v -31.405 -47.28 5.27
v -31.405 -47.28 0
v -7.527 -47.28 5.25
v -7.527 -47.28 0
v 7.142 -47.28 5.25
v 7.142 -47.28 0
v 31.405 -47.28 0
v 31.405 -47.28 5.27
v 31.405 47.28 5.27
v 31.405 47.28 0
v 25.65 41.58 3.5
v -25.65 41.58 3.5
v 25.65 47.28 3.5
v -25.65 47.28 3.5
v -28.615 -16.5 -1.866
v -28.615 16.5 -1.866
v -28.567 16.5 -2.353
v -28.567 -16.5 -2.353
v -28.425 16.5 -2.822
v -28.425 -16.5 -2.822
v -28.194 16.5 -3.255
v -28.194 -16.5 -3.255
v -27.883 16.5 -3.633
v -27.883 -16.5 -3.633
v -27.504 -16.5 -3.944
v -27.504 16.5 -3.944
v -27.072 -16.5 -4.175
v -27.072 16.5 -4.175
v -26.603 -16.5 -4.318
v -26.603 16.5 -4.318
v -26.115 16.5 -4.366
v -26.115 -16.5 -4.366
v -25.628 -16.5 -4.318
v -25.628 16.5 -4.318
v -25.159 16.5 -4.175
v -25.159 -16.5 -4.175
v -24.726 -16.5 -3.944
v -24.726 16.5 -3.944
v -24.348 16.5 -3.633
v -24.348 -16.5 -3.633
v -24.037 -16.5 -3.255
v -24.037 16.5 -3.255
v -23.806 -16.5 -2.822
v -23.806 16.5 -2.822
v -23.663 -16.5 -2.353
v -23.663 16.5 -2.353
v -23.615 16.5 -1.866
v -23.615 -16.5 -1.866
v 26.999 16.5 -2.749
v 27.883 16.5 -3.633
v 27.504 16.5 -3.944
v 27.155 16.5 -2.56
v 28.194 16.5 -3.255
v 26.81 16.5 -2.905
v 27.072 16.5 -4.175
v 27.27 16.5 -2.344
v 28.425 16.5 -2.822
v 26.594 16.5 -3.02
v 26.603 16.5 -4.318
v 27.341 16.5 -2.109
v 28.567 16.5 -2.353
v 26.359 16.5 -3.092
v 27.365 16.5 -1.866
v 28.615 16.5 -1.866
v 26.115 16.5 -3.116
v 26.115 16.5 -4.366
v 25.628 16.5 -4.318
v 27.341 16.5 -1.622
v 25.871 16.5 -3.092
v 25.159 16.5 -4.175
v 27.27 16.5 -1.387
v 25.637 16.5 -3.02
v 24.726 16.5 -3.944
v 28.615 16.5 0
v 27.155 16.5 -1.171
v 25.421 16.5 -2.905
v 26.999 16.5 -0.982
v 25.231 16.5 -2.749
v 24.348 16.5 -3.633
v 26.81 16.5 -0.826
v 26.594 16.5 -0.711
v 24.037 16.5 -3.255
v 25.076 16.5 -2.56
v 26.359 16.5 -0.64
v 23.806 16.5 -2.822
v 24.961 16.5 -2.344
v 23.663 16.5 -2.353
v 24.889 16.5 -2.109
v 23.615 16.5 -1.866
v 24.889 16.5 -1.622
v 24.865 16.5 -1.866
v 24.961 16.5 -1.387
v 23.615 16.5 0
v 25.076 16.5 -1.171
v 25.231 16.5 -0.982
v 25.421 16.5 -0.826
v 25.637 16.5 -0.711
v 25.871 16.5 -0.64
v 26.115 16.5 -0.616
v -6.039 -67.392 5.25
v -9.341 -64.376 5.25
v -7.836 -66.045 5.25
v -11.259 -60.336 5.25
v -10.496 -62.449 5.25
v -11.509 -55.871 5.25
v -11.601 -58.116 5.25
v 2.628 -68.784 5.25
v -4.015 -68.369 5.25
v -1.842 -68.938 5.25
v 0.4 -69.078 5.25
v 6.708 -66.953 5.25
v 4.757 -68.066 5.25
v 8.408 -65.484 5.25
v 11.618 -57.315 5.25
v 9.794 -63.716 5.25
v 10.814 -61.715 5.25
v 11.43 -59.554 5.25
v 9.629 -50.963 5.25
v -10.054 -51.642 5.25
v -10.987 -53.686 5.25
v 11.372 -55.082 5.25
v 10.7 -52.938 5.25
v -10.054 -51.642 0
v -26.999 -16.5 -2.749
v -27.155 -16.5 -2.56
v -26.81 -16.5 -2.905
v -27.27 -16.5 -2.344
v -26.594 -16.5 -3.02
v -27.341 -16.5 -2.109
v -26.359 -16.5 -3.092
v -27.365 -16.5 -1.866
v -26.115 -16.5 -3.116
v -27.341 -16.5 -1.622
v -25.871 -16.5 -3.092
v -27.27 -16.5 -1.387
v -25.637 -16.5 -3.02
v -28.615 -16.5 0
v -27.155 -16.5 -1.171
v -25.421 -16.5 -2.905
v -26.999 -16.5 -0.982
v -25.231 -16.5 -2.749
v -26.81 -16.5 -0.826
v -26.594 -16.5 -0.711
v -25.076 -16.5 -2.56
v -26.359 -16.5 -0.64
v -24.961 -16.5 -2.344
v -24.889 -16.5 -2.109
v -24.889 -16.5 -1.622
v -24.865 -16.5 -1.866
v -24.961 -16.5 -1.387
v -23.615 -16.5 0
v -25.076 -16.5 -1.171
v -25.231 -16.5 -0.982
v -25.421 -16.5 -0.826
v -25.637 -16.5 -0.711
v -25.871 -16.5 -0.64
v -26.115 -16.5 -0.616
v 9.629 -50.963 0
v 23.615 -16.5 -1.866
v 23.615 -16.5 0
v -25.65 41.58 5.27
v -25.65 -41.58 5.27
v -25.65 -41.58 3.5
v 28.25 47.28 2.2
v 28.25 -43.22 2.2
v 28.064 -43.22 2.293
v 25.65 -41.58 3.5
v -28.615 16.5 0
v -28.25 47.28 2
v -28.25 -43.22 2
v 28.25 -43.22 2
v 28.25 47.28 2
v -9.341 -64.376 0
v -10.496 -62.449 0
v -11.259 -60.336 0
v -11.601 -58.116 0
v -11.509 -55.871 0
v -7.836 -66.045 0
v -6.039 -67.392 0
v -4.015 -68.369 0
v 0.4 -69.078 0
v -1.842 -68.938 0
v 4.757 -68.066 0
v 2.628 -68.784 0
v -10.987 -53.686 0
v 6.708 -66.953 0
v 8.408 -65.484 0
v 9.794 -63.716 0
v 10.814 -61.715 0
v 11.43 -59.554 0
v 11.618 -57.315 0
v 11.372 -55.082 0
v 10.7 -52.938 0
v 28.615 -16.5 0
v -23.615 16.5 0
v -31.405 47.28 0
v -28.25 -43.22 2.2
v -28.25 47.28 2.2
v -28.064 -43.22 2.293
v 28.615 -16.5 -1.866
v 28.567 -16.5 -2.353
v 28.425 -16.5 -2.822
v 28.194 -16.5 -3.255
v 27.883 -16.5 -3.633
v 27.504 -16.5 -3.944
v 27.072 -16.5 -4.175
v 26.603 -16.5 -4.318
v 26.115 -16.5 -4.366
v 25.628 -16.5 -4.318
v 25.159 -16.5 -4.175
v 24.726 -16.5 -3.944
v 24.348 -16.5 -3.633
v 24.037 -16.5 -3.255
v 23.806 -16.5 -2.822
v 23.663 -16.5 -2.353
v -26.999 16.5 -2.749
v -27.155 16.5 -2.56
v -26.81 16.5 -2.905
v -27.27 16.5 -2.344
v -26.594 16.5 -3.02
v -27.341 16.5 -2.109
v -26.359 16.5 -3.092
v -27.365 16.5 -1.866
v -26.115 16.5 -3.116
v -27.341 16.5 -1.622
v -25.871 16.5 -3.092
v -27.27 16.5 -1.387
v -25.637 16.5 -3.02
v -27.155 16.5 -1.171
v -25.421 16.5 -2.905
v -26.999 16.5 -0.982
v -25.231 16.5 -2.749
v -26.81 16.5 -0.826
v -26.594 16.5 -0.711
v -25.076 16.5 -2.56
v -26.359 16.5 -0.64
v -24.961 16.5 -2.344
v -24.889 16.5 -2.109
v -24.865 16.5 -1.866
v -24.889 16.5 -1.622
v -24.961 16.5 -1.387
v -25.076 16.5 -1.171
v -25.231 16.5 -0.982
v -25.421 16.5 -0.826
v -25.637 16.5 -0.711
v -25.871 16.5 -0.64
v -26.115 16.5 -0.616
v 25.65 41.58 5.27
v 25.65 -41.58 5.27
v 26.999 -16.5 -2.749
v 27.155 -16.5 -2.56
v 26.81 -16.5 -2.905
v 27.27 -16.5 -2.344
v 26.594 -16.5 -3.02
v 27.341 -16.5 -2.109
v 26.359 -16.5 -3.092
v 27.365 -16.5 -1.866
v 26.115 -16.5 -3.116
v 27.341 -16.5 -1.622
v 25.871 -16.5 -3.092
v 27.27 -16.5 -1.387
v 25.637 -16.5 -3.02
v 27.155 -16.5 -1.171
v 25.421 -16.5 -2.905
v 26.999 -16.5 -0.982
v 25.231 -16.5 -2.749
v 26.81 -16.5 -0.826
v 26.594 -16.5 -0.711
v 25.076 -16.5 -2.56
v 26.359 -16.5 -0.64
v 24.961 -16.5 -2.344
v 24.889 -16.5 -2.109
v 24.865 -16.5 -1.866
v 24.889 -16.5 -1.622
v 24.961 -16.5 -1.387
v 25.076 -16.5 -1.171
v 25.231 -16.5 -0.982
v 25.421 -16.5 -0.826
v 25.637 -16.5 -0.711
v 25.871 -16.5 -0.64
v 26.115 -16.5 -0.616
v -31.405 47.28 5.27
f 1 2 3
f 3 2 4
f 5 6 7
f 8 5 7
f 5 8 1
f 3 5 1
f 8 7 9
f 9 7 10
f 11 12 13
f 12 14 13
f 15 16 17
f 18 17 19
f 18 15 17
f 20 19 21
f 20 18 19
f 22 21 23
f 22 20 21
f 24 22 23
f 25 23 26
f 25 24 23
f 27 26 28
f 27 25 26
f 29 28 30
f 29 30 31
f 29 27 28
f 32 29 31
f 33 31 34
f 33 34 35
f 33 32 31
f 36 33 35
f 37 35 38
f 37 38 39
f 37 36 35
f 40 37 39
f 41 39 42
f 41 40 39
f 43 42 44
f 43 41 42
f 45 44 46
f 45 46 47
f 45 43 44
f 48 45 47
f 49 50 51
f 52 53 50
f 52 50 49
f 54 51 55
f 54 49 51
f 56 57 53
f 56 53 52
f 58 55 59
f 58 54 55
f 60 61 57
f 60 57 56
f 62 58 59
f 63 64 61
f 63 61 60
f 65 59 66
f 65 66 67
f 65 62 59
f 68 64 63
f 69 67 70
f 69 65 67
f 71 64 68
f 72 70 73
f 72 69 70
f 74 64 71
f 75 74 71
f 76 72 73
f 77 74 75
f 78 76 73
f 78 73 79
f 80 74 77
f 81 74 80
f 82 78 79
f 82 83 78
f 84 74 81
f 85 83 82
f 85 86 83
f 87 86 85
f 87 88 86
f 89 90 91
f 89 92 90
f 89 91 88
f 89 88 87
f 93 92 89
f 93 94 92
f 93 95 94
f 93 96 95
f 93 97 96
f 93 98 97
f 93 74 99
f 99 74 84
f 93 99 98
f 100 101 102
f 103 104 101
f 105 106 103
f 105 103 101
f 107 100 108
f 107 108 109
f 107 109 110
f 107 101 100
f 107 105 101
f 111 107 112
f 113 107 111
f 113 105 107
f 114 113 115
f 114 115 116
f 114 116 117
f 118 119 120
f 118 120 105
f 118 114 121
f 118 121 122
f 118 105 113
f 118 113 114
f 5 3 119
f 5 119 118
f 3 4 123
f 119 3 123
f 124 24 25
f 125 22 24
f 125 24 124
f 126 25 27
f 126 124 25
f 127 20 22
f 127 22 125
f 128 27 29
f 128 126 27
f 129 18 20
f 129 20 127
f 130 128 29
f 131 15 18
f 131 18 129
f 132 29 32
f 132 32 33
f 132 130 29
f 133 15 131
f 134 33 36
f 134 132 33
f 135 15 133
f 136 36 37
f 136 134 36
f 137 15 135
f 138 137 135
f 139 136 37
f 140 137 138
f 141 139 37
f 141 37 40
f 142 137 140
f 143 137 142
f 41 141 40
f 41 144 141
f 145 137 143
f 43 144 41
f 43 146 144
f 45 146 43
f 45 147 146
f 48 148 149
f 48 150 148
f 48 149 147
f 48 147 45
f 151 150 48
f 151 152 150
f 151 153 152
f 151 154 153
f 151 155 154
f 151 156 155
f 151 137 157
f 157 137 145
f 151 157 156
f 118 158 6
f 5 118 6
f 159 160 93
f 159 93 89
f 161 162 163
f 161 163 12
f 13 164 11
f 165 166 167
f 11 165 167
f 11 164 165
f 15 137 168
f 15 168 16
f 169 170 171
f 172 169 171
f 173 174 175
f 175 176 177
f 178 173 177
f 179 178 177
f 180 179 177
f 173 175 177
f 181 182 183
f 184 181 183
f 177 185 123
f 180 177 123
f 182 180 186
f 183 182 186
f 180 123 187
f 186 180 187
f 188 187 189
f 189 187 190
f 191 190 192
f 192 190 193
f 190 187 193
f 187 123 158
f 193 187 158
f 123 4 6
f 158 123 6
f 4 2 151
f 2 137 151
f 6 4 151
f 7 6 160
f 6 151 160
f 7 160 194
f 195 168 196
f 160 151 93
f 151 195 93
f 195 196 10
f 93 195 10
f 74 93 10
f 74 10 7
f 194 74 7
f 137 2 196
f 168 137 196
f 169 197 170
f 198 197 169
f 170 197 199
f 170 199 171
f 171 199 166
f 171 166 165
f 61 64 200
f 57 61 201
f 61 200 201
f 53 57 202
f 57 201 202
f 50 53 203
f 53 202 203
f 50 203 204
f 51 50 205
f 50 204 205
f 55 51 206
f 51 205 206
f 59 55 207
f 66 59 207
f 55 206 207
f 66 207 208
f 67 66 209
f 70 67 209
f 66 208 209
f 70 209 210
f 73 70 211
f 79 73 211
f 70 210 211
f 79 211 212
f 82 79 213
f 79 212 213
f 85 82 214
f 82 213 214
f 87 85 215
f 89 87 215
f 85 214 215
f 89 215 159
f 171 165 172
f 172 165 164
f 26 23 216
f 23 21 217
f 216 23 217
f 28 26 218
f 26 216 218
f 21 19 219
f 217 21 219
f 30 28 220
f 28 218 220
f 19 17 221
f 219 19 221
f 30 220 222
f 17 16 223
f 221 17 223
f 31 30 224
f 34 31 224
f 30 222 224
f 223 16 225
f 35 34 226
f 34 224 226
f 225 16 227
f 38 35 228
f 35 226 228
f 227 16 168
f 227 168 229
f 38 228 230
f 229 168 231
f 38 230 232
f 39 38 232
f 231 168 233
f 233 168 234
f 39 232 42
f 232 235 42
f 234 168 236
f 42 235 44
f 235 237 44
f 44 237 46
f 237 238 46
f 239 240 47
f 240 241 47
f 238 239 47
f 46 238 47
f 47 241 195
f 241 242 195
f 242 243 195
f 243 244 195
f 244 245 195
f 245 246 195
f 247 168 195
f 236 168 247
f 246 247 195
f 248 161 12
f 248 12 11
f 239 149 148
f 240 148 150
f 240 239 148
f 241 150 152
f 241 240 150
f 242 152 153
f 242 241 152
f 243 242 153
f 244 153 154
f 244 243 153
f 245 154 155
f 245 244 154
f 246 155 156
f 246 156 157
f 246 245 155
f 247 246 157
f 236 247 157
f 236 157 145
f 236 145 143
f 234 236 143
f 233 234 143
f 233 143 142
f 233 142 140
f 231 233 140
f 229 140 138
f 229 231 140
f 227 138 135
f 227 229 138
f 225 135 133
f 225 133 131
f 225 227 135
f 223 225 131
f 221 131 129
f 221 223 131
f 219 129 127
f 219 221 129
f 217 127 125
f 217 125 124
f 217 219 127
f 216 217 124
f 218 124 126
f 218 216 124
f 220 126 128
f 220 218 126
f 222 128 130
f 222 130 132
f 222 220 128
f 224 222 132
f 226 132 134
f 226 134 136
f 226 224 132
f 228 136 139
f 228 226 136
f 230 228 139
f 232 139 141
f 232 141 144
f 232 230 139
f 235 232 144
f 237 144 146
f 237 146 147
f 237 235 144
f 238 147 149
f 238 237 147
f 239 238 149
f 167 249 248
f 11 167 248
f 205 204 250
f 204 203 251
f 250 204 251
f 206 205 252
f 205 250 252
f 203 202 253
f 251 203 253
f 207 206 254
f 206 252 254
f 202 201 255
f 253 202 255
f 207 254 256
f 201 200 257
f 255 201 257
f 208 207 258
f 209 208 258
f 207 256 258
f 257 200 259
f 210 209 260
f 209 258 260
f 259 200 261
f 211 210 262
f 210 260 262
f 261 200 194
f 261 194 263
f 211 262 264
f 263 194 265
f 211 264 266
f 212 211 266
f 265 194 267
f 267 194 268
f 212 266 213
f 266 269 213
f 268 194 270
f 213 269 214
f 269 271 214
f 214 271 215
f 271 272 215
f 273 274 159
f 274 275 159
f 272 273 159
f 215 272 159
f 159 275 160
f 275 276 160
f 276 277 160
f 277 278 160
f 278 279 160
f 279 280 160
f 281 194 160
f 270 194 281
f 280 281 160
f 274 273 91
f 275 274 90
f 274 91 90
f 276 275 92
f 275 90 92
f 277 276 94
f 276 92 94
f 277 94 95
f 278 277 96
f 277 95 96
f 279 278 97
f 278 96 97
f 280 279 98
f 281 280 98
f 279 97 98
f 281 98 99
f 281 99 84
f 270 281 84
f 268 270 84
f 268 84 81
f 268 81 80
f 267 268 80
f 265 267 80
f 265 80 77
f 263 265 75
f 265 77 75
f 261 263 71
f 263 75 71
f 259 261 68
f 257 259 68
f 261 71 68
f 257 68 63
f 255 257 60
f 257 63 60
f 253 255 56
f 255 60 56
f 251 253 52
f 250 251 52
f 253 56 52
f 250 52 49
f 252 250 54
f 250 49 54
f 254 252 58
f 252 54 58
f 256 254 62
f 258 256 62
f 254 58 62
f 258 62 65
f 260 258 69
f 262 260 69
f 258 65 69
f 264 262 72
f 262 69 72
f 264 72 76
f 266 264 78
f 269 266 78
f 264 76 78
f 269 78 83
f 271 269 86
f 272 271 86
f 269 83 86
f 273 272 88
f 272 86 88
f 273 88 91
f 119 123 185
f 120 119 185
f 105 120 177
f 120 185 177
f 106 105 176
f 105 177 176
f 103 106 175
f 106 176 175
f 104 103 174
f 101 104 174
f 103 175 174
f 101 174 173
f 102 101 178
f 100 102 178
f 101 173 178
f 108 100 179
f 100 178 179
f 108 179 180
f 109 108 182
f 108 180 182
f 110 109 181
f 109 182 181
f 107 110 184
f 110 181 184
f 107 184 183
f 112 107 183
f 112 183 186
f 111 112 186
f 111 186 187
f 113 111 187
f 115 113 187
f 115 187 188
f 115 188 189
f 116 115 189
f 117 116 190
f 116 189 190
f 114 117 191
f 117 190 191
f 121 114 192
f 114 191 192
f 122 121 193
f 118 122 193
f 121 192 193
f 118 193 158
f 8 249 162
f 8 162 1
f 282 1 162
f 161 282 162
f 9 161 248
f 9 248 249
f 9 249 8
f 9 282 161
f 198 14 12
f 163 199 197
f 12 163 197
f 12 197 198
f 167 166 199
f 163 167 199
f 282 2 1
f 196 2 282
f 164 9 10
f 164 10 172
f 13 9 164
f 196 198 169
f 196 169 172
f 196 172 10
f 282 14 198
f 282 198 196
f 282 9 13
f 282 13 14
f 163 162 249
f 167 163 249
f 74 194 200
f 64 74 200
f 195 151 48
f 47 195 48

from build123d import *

# Parameters (mm, degrees)
SKETCH_W        = 62.81
SKETCH_H        = 94.56
PAD_DEPTH       = 5.27
SKETCH001_W     = 51.3
SKETCH001_H     = 83.16
POCKET_DEPTH    = 3.27
SKETCH002_W     = 56.5
SKETCH002_H     = 90.5
POCKET001_DEPTH = 1.5
PAD001_DEPTH    = 90.5
PAD002_DEPTH    = 90.5
PAD003_DEPTH    = 28.5
SKETCH006_R     = 1.25
PAD004_DEPTH    = 16.5
PAD005_DEPTH    = 5.25


with BuildPart() as part:
    # Sketch → Pad (new body)
    with BuildSketch(Plane.XY):
        Rectangle(SKETCH_W, SKETCH_H)
    extrude(amount=PAD_DEPTH)

    # Sketch001 → Pocket (cut)
    with BuildSketch(Plane.XY.offset(5.27)):
        Rectangle(SKETCH001_W, SKETCH001_H)
    extrude(amount=-POCKET_DEPTH, mode=Mode.SUBTRACT)

    # Sketch002 → Pocket001 (cut)
    with BuildSketch(Plane.XY.offset(3.5)):
        with Locations((0, 2.03)):
            Rectangle(SKETCH002_W, SKETCH002_H)
    extrude(amount=-POCKET001_DEPTH, mode=Mode.SUBTRACT)

    # Sketch003 → Pad001 (join)
    with BuildSketch(Plane.XZ.offset(43.22)):
        Polygon((-25.65, 3.5), (-28.25, 2.2), (-28.25, 3.5), align=None)
    extrude(amount=-PAD001_DEPTH)

    # Sketch004 → Pad002 (join)
    with BuildSketch(Plane.XZ.offset(43.22)):
        Polygon((25.65, 3.5), (28.25, 3.5), (28.25, 2.2), align=None)
    extrude(amount=-PAD002_DEPTH)

    # Sketch005 → Pad003 (join, symmetric)
    with BuildSketch(Plane.YZ):
        Polygon((-41.58, 3.5), (-43.22, 2.293188), (-43.22, 3.5), align=None)
    extrude(amount=PAD003_DEPTH, both=True)

    # Sketch006 → Pad004 (join, symmetric)
    with BuildSketch(Plane.XZ):
        with BuildLine():
            Line((-28.615358, 0.722295), (-28.615358, -1.865583))
            ThreePointArc((-28.615358, -1.865583), (-26.115358, -4.365583), (-23.615358, -1.865583))
            Line((-23.615358, 0.722295), (-23.615358, -1.865583))
            Line((-28.615358, 0.722295), (-23.615358, 0.722295))
        make_face()
        with Locations((-26.115358, -1.865583)):
            Circle(SKETCH006_R, mode=Mode.SUBTRACT)
    pad004 = extrude(amount=PAD004_DEPTH, both=True)

    # Sketch007 → Pad005 (join)
    with BuildSketch(Plane.XY):
        with BuildLine():
            ThreePointArc((-10.054045, -51.641873), (0.400338, -69.077796), (9.629085, -50.963278))
            Line((9.629085, -50.963278), (6.442785, -46.244865))
            Line((-6.927812, -46.244865), (6.442785, -46.244865))
            Line((-6.927812, -46.244865), (-10.054045, -51.641873))
        make_face()
    extrude(amount=PAD005_DEPTH)

    # Mirrored: Pad004 across Sketch006 V_Axis
    add(pad004.mirror(Plane(origin=(0, 0, 0), x_dir=(0, -1, 0), z_dir=(1, 0, 0))))


solid = part.part
